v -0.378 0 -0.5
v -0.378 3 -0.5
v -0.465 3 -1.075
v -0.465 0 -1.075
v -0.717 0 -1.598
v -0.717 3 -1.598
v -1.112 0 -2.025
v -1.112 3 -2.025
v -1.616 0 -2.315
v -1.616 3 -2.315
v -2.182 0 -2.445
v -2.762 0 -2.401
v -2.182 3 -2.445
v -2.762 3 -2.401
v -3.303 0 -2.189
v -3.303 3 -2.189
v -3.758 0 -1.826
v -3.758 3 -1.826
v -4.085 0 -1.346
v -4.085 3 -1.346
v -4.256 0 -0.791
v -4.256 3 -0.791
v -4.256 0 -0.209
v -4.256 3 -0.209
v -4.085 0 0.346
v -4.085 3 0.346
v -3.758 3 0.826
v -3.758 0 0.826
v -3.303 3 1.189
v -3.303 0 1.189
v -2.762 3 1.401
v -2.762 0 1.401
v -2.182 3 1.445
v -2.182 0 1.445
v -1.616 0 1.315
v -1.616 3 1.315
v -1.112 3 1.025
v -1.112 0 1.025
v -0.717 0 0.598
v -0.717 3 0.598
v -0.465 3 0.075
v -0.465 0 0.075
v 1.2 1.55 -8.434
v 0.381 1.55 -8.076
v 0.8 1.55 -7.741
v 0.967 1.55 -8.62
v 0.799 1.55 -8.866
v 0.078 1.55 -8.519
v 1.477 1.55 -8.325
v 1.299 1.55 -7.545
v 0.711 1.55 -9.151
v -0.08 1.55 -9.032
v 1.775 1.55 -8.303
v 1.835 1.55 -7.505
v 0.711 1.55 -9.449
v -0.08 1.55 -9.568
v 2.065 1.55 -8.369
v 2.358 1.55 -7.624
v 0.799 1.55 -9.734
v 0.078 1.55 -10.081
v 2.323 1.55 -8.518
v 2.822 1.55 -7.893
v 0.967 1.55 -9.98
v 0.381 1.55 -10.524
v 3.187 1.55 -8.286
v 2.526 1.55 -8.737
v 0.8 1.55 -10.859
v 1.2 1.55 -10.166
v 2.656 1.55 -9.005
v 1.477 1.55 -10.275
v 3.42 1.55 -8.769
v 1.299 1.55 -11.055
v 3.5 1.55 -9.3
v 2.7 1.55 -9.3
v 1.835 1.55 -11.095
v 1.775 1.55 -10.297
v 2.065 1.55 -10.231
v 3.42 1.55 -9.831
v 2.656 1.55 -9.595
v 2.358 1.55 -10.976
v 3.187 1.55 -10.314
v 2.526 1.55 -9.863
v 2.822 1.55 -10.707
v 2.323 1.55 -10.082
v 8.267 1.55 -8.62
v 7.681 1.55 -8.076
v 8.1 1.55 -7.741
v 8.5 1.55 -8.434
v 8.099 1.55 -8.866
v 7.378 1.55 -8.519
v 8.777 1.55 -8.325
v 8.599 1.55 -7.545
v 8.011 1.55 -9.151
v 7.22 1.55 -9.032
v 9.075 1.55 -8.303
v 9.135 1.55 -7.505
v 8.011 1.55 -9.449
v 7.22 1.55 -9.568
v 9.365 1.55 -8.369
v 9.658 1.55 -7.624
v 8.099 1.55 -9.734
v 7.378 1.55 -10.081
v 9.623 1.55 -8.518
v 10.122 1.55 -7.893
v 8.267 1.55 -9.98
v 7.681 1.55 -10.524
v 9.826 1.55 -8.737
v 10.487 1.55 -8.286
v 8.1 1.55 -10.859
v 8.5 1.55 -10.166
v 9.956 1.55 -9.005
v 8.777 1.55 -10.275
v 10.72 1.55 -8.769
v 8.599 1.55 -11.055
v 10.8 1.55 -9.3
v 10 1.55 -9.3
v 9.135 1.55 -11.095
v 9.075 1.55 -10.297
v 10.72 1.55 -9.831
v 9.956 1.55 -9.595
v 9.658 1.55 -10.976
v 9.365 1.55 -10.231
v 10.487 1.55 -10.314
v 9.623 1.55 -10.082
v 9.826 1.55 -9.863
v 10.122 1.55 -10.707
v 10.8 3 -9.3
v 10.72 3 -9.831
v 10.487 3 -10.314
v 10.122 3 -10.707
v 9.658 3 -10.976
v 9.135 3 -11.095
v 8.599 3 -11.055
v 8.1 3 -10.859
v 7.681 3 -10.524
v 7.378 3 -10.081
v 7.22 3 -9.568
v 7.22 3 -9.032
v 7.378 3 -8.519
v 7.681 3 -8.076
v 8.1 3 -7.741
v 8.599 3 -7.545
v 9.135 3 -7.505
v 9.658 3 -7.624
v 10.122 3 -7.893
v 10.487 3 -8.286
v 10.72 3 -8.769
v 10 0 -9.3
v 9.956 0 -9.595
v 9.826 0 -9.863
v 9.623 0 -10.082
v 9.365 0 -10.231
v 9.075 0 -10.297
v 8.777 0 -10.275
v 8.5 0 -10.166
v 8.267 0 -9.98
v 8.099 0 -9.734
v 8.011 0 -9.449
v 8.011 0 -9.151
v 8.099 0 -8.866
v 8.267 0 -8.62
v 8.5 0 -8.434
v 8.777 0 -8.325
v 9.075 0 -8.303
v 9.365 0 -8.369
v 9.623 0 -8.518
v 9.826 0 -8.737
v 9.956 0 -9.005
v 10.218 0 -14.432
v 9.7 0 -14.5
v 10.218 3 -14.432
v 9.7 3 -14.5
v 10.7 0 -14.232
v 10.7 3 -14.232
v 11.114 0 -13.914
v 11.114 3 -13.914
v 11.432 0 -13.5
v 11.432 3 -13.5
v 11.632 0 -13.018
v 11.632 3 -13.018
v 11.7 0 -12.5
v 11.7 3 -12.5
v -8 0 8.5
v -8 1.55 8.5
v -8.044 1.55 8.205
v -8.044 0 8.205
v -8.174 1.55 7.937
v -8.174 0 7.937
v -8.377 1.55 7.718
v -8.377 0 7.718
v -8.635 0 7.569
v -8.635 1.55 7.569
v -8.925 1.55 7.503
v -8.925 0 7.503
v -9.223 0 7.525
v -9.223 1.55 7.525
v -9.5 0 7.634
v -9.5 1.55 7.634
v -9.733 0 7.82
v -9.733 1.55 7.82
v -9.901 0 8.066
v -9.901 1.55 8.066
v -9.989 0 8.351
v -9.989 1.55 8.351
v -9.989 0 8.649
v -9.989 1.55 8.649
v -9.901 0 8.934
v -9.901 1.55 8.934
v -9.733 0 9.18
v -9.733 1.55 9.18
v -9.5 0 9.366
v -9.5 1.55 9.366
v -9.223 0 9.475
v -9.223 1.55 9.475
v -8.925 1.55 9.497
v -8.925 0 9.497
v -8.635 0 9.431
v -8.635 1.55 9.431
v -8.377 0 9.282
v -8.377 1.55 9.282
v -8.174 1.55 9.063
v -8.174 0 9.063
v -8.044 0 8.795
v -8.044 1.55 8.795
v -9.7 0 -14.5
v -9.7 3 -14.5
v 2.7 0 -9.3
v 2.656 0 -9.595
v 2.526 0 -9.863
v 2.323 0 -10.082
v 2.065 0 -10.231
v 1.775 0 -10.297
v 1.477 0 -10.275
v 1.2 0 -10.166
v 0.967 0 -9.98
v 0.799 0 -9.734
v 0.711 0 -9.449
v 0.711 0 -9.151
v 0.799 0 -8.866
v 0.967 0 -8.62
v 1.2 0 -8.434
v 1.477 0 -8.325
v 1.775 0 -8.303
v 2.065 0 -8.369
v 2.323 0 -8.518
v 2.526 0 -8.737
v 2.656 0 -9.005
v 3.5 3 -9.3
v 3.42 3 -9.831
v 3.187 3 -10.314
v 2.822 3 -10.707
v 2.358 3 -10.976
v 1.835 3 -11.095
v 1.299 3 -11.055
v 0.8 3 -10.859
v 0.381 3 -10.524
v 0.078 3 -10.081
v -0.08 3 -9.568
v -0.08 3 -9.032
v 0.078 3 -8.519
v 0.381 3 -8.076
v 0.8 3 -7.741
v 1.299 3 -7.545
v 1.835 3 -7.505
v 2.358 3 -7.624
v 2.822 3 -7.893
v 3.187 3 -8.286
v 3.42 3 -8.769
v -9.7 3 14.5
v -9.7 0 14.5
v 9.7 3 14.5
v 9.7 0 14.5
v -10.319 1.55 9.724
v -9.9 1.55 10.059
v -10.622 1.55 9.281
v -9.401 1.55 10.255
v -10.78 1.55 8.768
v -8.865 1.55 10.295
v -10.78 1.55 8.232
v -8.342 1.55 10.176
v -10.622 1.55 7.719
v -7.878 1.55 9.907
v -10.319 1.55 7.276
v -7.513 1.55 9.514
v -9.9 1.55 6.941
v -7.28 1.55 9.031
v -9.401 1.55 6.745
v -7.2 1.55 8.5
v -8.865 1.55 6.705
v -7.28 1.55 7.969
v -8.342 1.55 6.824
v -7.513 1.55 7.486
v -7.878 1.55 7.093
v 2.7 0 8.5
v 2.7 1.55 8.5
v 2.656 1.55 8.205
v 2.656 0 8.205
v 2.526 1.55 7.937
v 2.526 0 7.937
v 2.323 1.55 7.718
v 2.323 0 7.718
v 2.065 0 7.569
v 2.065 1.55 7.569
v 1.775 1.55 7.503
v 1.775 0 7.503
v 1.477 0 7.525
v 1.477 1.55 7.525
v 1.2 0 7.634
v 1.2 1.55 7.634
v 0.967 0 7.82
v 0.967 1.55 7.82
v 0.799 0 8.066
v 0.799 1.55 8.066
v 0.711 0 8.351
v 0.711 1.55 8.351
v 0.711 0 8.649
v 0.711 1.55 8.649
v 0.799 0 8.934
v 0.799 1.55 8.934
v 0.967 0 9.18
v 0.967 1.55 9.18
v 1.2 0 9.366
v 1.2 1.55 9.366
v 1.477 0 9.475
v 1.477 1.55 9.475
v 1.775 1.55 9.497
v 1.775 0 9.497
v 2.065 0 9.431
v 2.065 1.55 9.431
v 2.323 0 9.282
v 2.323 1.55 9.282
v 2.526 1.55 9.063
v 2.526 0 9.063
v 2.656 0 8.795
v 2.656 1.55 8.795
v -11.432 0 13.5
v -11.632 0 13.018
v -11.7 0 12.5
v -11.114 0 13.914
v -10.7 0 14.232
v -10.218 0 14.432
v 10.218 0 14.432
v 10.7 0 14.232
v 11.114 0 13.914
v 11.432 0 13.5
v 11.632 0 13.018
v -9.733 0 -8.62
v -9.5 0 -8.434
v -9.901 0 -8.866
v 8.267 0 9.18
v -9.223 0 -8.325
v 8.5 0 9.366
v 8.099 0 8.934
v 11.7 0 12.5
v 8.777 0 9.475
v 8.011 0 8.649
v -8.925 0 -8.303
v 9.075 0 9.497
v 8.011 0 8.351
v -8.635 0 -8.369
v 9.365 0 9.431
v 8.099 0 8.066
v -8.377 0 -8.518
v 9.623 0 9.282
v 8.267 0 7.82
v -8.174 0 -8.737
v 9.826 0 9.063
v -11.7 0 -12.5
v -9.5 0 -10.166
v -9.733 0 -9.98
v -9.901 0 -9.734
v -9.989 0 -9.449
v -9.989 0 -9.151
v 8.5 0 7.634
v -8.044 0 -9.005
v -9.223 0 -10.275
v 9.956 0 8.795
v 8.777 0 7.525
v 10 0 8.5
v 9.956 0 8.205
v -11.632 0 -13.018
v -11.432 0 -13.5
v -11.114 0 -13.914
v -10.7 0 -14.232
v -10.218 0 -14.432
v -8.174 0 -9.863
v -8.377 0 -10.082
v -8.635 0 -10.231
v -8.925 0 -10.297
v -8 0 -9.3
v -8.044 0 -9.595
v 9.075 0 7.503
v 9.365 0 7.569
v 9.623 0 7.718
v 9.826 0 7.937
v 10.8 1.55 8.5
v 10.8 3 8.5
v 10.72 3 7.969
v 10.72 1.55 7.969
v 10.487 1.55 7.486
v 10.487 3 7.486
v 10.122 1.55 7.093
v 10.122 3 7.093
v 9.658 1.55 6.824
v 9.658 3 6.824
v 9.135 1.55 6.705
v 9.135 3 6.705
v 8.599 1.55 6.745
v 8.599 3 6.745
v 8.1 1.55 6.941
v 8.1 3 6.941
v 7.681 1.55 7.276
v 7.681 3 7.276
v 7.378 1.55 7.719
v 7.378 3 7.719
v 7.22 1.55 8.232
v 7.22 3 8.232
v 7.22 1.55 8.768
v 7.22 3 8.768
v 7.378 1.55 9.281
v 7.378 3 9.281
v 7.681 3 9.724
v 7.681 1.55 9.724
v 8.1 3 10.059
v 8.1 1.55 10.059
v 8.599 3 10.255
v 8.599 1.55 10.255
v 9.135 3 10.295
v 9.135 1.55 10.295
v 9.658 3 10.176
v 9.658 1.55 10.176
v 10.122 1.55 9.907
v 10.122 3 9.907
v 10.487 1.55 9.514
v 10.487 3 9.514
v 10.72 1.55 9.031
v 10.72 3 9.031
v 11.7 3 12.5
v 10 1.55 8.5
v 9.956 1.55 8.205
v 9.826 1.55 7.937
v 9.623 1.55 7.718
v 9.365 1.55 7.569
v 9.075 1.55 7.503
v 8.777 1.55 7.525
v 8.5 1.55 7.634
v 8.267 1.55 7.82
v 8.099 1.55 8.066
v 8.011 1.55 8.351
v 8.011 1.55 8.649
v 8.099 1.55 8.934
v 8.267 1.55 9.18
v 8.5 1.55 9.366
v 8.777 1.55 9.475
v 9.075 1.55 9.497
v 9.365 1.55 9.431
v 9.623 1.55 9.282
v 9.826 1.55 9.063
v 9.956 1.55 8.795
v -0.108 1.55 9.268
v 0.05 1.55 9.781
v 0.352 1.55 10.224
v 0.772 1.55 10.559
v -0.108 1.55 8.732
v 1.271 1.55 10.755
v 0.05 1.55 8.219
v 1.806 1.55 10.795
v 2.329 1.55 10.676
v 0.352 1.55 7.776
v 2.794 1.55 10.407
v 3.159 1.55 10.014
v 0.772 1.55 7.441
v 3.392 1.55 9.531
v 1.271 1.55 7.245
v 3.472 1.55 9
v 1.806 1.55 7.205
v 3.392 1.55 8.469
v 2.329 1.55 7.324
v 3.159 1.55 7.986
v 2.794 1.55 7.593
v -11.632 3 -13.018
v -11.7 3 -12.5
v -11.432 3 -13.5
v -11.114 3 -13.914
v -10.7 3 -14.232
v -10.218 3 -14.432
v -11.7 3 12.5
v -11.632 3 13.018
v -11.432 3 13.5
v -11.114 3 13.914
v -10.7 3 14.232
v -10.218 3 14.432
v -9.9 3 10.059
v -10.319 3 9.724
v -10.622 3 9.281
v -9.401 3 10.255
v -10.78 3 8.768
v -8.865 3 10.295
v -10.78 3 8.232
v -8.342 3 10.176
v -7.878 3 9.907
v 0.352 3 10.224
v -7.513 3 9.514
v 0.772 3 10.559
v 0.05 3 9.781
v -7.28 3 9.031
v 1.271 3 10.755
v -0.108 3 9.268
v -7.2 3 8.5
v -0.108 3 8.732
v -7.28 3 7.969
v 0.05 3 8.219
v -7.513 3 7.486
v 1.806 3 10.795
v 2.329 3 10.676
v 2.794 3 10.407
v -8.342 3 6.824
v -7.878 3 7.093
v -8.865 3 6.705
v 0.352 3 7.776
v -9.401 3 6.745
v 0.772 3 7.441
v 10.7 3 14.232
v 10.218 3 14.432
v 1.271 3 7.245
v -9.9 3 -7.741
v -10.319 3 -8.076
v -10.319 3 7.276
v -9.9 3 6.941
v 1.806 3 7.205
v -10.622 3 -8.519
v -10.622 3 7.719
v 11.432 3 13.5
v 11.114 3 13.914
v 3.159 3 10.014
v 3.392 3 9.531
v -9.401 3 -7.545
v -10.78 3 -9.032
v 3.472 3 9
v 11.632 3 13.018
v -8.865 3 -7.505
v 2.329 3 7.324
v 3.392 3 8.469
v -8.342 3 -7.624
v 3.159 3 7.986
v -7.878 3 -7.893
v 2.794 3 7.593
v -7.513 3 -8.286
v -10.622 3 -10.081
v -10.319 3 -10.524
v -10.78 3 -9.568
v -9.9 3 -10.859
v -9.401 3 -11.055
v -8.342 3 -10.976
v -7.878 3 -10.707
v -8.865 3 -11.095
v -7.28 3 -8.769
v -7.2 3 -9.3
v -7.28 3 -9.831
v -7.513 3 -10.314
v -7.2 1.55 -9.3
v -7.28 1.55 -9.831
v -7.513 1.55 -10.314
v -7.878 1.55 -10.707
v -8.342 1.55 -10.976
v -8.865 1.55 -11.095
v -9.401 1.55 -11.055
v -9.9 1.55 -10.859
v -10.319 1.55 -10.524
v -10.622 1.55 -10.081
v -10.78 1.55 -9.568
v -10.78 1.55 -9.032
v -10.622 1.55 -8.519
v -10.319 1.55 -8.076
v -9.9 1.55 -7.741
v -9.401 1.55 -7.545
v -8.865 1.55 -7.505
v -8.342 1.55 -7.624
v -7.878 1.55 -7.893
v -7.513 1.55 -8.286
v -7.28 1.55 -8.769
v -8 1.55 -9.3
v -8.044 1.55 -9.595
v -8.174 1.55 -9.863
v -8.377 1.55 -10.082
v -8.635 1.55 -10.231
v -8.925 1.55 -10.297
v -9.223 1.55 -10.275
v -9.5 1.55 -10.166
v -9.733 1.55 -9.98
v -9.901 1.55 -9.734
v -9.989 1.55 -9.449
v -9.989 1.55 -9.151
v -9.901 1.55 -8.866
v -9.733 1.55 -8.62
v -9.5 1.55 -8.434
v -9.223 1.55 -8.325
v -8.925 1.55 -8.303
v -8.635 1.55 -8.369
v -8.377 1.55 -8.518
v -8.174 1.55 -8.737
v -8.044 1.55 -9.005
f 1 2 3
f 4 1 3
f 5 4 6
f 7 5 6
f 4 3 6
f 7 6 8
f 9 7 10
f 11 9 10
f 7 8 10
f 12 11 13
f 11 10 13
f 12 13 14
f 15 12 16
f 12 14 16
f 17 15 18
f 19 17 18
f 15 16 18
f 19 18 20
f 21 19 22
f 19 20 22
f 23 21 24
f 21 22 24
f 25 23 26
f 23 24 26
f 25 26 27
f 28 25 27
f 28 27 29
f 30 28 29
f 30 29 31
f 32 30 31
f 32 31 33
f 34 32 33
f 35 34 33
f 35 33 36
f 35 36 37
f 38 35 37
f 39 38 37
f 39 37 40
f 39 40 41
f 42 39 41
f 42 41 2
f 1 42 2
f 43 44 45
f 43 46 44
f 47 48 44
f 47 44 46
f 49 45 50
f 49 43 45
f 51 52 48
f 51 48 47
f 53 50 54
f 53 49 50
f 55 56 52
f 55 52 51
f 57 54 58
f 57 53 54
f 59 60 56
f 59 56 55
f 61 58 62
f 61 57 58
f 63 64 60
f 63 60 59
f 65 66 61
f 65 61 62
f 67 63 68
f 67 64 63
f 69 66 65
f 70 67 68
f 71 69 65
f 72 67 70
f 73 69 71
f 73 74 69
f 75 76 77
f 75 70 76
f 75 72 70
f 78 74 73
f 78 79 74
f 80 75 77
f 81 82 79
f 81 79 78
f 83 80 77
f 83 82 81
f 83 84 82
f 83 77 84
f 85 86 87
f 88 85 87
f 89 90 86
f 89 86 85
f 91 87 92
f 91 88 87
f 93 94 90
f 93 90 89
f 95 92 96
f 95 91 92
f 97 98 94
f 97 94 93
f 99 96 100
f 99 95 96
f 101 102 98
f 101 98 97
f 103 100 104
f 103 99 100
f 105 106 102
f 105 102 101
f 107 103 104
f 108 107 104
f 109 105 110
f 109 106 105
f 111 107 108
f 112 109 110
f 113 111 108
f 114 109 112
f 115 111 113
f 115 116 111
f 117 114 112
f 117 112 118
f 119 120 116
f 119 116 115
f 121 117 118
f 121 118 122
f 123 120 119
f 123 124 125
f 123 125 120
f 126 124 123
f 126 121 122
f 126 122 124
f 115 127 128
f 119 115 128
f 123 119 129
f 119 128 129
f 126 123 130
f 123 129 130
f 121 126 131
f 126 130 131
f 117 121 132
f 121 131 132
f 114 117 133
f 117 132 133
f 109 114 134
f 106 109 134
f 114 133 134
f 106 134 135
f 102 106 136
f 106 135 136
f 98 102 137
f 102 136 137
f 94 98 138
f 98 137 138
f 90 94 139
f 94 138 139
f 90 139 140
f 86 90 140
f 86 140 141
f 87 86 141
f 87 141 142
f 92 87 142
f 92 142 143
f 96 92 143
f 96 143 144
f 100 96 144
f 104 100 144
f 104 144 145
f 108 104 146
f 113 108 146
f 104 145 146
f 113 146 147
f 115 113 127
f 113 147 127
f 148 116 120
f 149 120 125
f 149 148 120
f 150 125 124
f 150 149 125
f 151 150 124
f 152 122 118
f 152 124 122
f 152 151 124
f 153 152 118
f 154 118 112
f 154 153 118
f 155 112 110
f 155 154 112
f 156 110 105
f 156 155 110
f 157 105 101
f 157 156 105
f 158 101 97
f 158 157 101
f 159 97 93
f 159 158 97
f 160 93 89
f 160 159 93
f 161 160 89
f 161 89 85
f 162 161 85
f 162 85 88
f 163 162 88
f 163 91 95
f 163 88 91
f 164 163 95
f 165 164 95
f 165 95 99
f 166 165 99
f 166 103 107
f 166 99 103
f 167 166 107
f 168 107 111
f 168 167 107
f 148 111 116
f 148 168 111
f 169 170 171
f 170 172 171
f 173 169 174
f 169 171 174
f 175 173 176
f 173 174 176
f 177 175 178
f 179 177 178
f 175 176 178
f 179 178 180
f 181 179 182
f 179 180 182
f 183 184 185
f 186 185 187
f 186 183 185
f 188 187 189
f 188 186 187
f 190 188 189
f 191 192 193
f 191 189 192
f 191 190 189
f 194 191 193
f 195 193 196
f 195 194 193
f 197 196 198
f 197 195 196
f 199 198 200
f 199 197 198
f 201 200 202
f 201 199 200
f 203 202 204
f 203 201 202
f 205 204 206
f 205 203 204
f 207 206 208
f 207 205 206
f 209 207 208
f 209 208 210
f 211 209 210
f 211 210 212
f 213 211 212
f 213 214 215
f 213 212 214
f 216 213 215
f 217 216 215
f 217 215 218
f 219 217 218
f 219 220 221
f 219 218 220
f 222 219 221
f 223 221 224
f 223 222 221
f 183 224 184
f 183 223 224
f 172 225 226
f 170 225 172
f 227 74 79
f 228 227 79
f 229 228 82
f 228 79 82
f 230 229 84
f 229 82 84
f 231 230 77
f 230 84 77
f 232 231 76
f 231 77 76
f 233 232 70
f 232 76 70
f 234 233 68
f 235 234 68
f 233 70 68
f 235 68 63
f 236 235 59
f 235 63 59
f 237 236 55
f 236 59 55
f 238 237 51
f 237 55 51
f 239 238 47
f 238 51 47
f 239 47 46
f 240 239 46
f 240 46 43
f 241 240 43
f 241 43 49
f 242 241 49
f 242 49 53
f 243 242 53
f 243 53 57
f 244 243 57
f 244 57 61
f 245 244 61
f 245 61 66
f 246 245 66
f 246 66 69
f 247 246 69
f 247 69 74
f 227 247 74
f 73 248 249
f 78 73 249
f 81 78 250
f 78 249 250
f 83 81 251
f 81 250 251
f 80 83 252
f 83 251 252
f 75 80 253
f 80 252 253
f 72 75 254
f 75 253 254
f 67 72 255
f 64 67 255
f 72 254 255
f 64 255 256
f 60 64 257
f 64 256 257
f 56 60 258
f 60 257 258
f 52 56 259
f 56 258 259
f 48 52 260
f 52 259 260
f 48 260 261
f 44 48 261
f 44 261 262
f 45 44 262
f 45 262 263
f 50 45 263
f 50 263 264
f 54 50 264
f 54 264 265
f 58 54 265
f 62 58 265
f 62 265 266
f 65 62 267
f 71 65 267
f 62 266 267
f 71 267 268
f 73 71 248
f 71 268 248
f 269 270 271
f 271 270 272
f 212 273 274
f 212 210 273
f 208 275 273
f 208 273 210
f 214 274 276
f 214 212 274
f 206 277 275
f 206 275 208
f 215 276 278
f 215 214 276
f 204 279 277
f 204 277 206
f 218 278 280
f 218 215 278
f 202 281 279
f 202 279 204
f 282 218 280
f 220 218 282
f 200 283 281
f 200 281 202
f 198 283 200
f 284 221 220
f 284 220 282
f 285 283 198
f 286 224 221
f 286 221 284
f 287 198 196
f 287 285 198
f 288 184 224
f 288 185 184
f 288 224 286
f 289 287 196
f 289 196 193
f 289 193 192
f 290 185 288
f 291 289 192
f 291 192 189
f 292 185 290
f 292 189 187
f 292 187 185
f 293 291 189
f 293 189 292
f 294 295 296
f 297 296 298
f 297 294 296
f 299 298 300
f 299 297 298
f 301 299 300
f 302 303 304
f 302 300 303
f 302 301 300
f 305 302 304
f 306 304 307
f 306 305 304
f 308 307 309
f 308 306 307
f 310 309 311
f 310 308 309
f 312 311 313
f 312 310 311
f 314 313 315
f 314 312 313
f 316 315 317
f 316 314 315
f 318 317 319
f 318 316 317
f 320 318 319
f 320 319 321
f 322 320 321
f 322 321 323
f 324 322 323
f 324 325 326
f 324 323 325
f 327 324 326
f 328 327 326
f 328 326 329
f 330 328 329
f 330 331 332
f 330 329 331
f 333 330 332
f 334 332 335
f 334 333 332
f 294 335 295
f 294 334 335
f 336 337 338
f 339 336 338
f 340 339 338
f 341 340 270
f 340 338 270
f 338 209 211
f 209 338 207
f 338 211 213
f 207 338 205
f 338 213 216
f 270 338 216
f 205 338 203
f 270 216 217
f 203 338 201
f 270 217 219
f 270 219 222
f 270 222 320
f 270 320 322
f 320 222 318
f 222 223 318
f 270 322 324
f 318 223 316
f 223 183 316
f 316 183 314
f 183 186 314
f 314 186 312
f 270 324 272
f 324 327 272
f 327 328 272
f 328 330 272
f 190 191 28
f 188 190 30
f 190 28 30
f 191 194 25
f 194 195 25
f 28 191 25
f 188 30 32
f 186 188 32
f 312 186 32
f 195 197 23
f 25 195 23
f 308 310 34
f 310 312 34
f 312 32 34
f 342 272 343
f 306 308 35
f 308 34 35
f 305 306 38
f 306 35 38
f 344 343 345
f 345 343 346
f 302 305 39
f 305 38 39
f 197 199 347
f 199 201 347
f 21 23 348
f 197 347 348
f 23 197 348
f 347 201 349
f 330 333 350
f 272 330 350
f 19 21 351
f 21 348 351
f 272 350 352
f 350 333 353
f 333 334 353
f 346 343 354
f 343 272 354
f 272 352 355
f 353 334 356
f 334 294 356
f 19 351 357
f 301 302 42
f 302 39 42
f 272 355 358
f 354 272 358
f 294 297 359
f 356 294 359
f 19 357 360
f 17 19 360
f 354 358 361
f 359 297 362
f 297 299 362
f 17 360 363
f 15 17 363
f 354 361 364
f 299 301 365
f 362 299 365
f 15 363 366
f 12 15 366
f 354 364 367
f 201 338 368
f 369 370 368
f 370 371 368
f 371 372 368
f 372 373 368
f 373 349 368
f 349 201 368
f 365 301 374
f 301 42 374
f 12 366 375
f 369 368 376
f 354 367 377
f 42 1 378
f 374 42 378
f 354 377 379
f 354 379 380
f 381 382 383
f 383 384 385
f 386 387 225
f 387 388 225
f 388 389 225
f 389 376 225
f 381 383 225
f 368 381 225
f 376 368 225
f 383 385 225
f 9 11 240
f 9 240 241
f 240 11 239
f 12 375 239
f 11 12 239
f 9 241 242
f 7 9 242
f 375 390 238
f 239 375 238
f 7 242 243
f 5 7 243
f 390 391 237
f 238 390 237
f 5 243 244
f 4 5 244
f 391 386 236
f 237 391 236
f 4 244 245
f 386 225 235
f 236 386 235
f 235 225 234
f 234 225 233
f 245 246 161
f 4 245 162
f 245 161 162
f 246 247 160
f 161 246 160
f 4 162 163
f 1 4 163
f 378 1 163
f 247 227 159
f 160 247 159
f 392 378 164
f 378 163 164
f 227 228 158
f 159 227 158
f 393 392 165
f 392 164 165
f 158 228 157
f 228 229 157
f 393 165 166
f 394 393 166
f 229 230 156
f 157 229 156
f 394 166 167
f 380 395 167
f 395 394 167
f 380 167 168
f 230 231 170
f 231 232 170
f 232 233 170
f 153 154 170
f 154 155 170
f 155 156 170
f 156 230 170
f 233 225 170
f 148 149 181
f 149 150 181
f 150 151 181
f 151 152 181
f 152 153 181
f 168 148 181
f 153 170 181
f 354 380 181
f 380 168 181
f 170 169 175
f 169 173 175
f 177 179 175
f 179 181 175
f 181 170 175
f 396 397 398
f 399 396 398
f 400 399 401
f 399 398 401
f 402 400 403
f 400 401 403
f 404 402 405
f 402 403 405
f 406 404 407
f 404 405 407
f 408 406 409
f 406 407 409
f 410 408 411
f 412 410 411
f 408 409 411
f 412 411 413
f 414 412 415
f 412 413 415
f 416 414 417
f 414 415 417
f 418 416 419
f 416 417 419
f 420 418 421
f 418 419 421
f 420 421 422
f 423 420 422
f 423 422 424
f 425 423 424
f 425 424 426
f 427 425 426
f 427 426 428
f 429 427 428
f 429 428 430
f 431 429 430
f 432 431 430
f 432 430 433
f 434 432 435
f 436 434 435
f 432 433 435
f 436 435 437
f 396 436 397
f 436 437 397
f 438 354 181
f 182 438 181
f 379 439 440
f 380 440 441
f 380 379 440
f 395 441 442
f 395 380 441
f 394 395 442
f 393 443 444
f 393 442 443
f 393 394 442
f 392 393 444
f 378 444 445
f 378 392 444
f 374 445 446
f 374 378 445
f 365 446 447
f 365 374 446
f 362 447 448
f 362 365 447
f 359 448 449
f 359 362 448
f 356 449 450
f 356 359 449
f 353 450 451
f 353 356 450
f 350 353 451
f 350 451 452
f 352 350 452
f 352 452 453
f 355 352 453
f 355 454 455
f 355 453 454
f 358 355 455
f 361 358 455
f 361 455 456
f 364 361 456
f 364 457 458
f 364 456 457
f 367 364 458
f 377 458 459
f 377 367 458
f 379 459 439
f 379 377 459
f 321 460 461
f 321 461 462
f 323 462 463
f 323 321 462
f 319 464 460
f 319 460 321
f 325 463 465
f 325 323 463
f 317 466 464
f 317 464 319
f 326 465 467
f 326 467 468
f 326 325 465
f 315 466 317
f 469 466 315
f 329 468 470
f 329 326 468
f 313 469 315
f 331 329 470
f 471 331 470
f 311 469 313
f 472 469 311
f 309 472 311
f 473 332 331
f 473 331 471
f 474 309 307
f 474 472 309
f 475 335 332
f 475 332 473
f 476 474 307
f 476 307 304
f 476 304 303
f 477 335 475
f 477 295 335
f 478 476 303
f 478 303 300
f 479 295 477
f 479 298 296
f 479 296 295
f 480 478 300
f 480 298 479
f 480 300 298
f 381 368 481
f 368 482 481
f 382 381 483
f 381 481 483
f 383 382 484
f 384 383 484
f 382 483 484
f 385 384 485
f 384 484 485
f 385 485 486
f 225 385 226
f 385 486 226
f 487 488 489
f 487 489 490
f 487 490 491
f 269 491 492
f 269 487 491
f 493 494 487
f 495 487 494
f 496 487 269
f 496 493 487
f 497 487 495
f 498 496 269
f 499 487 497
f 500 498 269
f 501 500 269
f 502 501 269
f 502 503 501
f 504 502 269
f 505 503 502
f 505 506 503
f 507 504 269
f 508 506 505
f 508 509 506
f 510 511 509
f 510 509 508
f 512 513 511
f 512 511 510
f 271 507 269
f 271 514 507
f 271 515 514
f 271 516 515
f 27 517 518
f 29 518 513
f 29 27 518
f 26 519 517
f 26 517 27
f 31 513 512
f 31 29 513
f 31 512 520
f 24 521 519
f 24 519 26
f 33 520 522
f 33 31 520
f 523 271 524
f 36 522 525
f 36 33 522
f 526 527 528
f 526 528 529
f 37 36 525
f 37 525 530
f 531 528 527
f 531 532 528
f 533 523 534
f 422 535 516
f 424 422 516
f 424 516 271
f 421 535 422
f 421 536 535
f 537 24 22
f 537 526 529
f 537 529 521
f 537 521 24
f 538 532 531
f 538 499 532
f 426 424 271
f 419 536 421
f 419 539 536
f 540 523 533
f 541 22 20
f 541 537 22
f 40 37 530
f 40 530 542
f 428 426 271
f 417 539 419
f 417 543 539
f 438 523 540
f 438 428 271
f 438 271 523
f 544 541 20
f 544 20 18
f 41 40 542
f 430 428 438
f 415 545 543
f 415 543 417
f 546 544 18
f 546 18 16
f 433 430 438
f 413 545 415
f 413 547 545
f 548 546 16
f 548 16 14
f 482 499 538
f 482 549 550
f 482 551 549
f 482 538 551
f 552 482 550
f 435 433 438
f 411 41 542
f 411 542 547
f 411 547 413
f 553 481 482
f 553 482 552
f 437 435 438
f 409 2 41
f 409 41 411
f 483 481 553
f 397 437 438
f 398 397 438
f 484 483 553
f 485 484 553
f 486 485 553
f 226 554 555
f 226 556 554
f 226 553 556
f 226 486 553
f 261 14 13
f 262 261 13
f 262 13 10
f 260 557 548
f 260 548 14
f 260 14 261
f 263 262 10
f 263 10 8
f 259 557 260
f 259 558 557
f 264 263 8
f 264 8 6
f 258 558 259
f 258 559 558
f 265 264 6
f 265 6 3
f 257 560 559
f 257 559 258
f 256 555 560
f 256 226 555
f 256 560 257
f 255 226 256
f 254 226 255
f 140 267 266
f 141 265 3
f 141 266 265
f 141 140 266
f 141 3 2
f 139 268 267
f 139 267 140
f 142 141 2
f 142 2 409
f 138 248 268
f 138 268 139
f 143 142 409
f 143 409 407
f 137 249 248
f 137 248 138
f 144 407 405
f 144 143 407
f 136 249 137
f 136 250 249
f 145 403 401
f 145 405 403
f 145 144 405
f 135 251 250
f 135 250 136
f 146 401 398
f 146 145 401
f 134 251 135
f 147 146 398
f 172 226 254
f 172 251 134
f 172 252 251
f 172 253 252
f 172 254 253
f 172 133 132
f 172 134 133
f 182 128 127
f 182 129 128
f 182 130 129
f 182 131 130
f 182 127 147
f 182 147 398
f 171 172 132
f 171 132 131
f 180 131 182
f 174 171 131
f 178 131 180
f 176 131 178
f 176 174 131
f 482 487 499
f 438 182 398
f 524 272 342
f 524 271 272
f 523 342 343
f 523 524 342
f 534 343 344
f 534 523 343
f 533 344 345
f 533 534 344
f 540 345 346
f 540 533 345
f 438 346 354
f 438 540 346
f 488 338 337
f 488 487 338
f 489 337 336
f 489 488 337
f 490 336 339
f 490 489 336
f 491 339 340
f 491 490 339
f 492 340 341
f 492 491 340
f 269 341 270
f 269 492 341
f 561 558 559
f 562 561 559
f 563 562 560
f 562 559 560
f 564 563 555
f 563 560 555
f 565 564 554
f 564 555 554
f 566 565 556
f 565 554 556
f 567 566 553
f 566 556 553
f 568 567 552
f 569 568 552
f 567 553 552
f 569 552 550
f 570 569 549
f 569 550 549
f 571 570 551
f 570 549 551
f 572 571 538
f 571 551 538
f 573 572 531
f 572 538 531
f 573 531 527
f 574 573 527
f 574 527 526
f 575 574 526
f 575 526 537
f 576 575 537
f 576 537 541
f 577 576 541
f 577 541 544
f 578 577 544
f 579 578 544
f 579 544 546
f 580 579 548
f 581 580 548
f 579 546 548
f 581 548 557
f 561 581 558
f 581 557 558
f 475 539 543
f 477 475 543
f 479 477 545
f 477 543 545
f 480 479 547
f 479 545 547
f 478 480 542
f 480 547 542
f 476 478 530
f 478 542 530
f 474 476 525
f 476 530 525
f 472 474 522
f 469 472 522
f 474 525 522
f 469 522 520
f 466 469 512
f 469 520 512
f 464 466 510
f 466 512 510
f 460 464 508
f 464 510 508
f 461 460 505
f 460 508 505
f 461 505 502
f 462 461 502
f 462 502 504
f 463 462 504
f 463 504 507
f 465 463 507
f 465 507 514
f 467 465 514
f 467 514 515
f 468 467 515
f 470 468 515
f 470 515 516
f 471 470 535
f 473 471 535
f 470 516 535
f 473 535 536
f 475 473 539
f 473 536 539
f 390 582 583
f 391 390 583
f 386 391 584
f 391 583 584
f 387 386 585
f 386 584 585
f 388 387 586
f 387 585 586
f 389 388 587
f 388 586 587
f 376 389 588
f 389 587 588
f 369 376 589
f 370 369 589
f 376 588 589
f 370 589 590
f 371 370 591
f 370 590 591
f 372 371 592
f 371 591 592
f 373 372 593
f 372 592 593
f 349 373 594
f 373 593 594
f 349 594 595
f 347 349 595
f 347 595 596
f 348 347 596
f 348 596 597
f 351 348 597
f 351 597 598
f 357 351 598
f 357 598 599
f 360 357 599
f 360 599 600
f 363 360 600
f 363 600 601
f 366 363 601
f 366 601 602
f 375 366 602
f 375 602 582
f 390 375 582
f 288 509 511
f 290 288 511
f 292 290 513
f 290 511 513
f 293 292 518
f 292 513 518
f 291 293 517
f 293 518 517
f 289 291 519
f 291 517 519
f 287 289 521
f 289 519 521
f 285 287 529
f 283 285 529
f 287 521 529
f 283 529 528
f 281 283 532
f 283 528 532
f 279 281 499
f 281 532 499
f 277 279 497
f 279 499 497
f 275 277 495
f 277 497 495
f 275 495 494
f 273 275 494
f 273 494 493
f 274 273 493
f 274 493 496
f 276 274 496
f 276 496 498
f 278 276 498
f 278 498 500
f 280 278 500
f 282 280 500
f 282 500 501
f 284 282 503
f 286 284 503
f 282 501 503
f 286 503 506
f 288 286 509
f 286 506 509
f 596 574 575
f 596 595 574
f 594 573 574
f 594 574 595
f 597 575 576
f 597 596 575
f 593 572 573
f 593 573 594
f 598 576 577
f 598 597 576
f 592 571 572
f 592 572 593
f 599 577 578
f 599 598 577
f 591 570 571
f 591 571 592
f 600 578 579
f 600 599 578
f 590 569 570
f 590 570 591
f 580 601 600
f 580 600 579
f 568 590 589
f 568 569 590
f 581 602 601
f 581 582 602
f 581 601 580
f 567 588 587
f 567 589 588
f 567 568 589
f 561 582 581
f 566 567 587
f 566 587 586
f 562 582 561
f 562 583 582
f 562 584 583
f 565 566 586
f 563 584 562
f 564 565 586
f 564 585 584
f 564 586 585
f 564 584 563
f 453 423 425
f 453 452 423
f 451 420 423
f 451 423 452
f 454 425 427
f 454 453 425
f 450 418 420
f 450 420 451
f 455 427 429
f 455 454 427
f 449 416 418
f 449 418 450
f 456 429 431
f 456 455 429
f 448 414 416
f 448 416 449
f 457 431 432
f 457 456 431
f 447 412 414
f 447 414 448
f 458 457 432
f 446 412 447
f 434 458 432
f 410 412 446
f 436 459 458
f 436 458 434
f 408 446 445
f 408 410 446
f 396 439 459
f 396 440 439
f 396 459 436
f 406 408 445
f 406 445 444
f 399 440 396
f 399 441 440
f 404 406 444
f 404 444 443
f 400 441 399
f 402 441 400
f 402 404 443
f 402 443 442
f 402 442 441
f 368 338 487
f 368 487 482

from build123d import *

# Parameters (mm, degrees)
SKETCH1_W           = 23.4
SKETCH1_H           = 29
SKETCH1_R           = 1
BOSS_EXTRUDE1_DEPTH = 3
FILLET1_R           = 2
SKETCH8_R           = 1
CUT_EXTRUDE5_DEPTH  = 10
SKETCH10_R          = 1.95
CUT_EXTRUDE6_DEPTH  = 10
SKETCH11_R          = 1.8
CUT_EXTRUDE7_DEPTH  = 1.45


with BuildPart() as part:
    # Sketch1 → Boss-Extrude1 (new body)
    with BuildSketch(Plane(origin=(0, 0, 0), x_dir=(1, 0, 0), z_dir=(0, 1, 0))):
        Rectangle(SKETCH1_W, SKETCH1_H)
        with Locations((9, 9.3)):
            Circle(SKETCH1_R, mode=Mode.SUBTRACT)
        with Locations((9, -8.5)):
            Circle(SKETCH1_R, mode=Mode.SUBTRACT)
        with Locations((-9, -8.5)):
            Circle(SKETCH1_R, mode=Mode.SUBTRACT)
        with Locations((1.7, -8.5)):
            Circle(SKETCH1_R, mode=Mode.SUBTRACT)
    extrude(amount=BOSS_EXTRUDE1_DEPTH)

    # Fillet1
    fillet1_edges = [part.edges().sort_by_distance(p)[0] for p in [
        (11.7, 1.5, 14.5),
        (-11.7, 1.5, 14.5),
        (-11.7, 1.5, -14.5),
        (11.7, 1.5, -14.5),
    ]]
    fillet(fillet1_edges, radius=FILLET1_R)

    # Sketch8 → Cut-Extrude5 (cut)
    with BuildSketch(Plane(origin=(0, 3, 0), x_dir=(1, 0, 0), z_dir=(0, 1, 0))):
        with Locations((1.7, 9.3)):
            Circle(SKETCH8_R)
        with Locations((-9, 9.3)):
            Circle(SKETCH8_R)
    extrude(amount=-CUT_EXTRUDE5_DEPTH, mode=Mode.SUBTRACT)

    # Sketch10 → Cut-Extrude6 (cut)
    with BuildSketch(Plane(origin=(0, 3, 0), x_dir=(1, 0, 0), z_dir=(0, 1, 0))):
        with Locations((-2.328177417, 0.5)):
            Circle(SKETCH10_R)
    extrude(amount=-CUT_EXTRUDE6_DEPTH, mode=Mode.SUBTRACT)

    # Sketch11 → Cut-Extrude7 (cut)
    with BuildSketch(Plane(origin=(0, 3, 0), x_dir=(1, 0, 0), z_dir=(0, 1, 0))):
        with Locations((-9, -8.5)):
            Circle(SKETCH11_R)
        with Locations((1.671822583, -9)):
            Circle(SKETCH11_R)
        with Locations((9, -8.5)):
            Circle(SKETCH11_R)
        with Locations((9, 9.3)):
            Circle(SKETCH11_R)
        with Locations((1.7, 9.3)):
            Circle(SKETCH11_R)
        with Locations((-9, 9.3)):
            Circle(SKETCH11_R)
    extrude(amount=-CUT_EXTRUDE7_DEPTH, mode=Mode.SUBTRACT)


solid = part.part
